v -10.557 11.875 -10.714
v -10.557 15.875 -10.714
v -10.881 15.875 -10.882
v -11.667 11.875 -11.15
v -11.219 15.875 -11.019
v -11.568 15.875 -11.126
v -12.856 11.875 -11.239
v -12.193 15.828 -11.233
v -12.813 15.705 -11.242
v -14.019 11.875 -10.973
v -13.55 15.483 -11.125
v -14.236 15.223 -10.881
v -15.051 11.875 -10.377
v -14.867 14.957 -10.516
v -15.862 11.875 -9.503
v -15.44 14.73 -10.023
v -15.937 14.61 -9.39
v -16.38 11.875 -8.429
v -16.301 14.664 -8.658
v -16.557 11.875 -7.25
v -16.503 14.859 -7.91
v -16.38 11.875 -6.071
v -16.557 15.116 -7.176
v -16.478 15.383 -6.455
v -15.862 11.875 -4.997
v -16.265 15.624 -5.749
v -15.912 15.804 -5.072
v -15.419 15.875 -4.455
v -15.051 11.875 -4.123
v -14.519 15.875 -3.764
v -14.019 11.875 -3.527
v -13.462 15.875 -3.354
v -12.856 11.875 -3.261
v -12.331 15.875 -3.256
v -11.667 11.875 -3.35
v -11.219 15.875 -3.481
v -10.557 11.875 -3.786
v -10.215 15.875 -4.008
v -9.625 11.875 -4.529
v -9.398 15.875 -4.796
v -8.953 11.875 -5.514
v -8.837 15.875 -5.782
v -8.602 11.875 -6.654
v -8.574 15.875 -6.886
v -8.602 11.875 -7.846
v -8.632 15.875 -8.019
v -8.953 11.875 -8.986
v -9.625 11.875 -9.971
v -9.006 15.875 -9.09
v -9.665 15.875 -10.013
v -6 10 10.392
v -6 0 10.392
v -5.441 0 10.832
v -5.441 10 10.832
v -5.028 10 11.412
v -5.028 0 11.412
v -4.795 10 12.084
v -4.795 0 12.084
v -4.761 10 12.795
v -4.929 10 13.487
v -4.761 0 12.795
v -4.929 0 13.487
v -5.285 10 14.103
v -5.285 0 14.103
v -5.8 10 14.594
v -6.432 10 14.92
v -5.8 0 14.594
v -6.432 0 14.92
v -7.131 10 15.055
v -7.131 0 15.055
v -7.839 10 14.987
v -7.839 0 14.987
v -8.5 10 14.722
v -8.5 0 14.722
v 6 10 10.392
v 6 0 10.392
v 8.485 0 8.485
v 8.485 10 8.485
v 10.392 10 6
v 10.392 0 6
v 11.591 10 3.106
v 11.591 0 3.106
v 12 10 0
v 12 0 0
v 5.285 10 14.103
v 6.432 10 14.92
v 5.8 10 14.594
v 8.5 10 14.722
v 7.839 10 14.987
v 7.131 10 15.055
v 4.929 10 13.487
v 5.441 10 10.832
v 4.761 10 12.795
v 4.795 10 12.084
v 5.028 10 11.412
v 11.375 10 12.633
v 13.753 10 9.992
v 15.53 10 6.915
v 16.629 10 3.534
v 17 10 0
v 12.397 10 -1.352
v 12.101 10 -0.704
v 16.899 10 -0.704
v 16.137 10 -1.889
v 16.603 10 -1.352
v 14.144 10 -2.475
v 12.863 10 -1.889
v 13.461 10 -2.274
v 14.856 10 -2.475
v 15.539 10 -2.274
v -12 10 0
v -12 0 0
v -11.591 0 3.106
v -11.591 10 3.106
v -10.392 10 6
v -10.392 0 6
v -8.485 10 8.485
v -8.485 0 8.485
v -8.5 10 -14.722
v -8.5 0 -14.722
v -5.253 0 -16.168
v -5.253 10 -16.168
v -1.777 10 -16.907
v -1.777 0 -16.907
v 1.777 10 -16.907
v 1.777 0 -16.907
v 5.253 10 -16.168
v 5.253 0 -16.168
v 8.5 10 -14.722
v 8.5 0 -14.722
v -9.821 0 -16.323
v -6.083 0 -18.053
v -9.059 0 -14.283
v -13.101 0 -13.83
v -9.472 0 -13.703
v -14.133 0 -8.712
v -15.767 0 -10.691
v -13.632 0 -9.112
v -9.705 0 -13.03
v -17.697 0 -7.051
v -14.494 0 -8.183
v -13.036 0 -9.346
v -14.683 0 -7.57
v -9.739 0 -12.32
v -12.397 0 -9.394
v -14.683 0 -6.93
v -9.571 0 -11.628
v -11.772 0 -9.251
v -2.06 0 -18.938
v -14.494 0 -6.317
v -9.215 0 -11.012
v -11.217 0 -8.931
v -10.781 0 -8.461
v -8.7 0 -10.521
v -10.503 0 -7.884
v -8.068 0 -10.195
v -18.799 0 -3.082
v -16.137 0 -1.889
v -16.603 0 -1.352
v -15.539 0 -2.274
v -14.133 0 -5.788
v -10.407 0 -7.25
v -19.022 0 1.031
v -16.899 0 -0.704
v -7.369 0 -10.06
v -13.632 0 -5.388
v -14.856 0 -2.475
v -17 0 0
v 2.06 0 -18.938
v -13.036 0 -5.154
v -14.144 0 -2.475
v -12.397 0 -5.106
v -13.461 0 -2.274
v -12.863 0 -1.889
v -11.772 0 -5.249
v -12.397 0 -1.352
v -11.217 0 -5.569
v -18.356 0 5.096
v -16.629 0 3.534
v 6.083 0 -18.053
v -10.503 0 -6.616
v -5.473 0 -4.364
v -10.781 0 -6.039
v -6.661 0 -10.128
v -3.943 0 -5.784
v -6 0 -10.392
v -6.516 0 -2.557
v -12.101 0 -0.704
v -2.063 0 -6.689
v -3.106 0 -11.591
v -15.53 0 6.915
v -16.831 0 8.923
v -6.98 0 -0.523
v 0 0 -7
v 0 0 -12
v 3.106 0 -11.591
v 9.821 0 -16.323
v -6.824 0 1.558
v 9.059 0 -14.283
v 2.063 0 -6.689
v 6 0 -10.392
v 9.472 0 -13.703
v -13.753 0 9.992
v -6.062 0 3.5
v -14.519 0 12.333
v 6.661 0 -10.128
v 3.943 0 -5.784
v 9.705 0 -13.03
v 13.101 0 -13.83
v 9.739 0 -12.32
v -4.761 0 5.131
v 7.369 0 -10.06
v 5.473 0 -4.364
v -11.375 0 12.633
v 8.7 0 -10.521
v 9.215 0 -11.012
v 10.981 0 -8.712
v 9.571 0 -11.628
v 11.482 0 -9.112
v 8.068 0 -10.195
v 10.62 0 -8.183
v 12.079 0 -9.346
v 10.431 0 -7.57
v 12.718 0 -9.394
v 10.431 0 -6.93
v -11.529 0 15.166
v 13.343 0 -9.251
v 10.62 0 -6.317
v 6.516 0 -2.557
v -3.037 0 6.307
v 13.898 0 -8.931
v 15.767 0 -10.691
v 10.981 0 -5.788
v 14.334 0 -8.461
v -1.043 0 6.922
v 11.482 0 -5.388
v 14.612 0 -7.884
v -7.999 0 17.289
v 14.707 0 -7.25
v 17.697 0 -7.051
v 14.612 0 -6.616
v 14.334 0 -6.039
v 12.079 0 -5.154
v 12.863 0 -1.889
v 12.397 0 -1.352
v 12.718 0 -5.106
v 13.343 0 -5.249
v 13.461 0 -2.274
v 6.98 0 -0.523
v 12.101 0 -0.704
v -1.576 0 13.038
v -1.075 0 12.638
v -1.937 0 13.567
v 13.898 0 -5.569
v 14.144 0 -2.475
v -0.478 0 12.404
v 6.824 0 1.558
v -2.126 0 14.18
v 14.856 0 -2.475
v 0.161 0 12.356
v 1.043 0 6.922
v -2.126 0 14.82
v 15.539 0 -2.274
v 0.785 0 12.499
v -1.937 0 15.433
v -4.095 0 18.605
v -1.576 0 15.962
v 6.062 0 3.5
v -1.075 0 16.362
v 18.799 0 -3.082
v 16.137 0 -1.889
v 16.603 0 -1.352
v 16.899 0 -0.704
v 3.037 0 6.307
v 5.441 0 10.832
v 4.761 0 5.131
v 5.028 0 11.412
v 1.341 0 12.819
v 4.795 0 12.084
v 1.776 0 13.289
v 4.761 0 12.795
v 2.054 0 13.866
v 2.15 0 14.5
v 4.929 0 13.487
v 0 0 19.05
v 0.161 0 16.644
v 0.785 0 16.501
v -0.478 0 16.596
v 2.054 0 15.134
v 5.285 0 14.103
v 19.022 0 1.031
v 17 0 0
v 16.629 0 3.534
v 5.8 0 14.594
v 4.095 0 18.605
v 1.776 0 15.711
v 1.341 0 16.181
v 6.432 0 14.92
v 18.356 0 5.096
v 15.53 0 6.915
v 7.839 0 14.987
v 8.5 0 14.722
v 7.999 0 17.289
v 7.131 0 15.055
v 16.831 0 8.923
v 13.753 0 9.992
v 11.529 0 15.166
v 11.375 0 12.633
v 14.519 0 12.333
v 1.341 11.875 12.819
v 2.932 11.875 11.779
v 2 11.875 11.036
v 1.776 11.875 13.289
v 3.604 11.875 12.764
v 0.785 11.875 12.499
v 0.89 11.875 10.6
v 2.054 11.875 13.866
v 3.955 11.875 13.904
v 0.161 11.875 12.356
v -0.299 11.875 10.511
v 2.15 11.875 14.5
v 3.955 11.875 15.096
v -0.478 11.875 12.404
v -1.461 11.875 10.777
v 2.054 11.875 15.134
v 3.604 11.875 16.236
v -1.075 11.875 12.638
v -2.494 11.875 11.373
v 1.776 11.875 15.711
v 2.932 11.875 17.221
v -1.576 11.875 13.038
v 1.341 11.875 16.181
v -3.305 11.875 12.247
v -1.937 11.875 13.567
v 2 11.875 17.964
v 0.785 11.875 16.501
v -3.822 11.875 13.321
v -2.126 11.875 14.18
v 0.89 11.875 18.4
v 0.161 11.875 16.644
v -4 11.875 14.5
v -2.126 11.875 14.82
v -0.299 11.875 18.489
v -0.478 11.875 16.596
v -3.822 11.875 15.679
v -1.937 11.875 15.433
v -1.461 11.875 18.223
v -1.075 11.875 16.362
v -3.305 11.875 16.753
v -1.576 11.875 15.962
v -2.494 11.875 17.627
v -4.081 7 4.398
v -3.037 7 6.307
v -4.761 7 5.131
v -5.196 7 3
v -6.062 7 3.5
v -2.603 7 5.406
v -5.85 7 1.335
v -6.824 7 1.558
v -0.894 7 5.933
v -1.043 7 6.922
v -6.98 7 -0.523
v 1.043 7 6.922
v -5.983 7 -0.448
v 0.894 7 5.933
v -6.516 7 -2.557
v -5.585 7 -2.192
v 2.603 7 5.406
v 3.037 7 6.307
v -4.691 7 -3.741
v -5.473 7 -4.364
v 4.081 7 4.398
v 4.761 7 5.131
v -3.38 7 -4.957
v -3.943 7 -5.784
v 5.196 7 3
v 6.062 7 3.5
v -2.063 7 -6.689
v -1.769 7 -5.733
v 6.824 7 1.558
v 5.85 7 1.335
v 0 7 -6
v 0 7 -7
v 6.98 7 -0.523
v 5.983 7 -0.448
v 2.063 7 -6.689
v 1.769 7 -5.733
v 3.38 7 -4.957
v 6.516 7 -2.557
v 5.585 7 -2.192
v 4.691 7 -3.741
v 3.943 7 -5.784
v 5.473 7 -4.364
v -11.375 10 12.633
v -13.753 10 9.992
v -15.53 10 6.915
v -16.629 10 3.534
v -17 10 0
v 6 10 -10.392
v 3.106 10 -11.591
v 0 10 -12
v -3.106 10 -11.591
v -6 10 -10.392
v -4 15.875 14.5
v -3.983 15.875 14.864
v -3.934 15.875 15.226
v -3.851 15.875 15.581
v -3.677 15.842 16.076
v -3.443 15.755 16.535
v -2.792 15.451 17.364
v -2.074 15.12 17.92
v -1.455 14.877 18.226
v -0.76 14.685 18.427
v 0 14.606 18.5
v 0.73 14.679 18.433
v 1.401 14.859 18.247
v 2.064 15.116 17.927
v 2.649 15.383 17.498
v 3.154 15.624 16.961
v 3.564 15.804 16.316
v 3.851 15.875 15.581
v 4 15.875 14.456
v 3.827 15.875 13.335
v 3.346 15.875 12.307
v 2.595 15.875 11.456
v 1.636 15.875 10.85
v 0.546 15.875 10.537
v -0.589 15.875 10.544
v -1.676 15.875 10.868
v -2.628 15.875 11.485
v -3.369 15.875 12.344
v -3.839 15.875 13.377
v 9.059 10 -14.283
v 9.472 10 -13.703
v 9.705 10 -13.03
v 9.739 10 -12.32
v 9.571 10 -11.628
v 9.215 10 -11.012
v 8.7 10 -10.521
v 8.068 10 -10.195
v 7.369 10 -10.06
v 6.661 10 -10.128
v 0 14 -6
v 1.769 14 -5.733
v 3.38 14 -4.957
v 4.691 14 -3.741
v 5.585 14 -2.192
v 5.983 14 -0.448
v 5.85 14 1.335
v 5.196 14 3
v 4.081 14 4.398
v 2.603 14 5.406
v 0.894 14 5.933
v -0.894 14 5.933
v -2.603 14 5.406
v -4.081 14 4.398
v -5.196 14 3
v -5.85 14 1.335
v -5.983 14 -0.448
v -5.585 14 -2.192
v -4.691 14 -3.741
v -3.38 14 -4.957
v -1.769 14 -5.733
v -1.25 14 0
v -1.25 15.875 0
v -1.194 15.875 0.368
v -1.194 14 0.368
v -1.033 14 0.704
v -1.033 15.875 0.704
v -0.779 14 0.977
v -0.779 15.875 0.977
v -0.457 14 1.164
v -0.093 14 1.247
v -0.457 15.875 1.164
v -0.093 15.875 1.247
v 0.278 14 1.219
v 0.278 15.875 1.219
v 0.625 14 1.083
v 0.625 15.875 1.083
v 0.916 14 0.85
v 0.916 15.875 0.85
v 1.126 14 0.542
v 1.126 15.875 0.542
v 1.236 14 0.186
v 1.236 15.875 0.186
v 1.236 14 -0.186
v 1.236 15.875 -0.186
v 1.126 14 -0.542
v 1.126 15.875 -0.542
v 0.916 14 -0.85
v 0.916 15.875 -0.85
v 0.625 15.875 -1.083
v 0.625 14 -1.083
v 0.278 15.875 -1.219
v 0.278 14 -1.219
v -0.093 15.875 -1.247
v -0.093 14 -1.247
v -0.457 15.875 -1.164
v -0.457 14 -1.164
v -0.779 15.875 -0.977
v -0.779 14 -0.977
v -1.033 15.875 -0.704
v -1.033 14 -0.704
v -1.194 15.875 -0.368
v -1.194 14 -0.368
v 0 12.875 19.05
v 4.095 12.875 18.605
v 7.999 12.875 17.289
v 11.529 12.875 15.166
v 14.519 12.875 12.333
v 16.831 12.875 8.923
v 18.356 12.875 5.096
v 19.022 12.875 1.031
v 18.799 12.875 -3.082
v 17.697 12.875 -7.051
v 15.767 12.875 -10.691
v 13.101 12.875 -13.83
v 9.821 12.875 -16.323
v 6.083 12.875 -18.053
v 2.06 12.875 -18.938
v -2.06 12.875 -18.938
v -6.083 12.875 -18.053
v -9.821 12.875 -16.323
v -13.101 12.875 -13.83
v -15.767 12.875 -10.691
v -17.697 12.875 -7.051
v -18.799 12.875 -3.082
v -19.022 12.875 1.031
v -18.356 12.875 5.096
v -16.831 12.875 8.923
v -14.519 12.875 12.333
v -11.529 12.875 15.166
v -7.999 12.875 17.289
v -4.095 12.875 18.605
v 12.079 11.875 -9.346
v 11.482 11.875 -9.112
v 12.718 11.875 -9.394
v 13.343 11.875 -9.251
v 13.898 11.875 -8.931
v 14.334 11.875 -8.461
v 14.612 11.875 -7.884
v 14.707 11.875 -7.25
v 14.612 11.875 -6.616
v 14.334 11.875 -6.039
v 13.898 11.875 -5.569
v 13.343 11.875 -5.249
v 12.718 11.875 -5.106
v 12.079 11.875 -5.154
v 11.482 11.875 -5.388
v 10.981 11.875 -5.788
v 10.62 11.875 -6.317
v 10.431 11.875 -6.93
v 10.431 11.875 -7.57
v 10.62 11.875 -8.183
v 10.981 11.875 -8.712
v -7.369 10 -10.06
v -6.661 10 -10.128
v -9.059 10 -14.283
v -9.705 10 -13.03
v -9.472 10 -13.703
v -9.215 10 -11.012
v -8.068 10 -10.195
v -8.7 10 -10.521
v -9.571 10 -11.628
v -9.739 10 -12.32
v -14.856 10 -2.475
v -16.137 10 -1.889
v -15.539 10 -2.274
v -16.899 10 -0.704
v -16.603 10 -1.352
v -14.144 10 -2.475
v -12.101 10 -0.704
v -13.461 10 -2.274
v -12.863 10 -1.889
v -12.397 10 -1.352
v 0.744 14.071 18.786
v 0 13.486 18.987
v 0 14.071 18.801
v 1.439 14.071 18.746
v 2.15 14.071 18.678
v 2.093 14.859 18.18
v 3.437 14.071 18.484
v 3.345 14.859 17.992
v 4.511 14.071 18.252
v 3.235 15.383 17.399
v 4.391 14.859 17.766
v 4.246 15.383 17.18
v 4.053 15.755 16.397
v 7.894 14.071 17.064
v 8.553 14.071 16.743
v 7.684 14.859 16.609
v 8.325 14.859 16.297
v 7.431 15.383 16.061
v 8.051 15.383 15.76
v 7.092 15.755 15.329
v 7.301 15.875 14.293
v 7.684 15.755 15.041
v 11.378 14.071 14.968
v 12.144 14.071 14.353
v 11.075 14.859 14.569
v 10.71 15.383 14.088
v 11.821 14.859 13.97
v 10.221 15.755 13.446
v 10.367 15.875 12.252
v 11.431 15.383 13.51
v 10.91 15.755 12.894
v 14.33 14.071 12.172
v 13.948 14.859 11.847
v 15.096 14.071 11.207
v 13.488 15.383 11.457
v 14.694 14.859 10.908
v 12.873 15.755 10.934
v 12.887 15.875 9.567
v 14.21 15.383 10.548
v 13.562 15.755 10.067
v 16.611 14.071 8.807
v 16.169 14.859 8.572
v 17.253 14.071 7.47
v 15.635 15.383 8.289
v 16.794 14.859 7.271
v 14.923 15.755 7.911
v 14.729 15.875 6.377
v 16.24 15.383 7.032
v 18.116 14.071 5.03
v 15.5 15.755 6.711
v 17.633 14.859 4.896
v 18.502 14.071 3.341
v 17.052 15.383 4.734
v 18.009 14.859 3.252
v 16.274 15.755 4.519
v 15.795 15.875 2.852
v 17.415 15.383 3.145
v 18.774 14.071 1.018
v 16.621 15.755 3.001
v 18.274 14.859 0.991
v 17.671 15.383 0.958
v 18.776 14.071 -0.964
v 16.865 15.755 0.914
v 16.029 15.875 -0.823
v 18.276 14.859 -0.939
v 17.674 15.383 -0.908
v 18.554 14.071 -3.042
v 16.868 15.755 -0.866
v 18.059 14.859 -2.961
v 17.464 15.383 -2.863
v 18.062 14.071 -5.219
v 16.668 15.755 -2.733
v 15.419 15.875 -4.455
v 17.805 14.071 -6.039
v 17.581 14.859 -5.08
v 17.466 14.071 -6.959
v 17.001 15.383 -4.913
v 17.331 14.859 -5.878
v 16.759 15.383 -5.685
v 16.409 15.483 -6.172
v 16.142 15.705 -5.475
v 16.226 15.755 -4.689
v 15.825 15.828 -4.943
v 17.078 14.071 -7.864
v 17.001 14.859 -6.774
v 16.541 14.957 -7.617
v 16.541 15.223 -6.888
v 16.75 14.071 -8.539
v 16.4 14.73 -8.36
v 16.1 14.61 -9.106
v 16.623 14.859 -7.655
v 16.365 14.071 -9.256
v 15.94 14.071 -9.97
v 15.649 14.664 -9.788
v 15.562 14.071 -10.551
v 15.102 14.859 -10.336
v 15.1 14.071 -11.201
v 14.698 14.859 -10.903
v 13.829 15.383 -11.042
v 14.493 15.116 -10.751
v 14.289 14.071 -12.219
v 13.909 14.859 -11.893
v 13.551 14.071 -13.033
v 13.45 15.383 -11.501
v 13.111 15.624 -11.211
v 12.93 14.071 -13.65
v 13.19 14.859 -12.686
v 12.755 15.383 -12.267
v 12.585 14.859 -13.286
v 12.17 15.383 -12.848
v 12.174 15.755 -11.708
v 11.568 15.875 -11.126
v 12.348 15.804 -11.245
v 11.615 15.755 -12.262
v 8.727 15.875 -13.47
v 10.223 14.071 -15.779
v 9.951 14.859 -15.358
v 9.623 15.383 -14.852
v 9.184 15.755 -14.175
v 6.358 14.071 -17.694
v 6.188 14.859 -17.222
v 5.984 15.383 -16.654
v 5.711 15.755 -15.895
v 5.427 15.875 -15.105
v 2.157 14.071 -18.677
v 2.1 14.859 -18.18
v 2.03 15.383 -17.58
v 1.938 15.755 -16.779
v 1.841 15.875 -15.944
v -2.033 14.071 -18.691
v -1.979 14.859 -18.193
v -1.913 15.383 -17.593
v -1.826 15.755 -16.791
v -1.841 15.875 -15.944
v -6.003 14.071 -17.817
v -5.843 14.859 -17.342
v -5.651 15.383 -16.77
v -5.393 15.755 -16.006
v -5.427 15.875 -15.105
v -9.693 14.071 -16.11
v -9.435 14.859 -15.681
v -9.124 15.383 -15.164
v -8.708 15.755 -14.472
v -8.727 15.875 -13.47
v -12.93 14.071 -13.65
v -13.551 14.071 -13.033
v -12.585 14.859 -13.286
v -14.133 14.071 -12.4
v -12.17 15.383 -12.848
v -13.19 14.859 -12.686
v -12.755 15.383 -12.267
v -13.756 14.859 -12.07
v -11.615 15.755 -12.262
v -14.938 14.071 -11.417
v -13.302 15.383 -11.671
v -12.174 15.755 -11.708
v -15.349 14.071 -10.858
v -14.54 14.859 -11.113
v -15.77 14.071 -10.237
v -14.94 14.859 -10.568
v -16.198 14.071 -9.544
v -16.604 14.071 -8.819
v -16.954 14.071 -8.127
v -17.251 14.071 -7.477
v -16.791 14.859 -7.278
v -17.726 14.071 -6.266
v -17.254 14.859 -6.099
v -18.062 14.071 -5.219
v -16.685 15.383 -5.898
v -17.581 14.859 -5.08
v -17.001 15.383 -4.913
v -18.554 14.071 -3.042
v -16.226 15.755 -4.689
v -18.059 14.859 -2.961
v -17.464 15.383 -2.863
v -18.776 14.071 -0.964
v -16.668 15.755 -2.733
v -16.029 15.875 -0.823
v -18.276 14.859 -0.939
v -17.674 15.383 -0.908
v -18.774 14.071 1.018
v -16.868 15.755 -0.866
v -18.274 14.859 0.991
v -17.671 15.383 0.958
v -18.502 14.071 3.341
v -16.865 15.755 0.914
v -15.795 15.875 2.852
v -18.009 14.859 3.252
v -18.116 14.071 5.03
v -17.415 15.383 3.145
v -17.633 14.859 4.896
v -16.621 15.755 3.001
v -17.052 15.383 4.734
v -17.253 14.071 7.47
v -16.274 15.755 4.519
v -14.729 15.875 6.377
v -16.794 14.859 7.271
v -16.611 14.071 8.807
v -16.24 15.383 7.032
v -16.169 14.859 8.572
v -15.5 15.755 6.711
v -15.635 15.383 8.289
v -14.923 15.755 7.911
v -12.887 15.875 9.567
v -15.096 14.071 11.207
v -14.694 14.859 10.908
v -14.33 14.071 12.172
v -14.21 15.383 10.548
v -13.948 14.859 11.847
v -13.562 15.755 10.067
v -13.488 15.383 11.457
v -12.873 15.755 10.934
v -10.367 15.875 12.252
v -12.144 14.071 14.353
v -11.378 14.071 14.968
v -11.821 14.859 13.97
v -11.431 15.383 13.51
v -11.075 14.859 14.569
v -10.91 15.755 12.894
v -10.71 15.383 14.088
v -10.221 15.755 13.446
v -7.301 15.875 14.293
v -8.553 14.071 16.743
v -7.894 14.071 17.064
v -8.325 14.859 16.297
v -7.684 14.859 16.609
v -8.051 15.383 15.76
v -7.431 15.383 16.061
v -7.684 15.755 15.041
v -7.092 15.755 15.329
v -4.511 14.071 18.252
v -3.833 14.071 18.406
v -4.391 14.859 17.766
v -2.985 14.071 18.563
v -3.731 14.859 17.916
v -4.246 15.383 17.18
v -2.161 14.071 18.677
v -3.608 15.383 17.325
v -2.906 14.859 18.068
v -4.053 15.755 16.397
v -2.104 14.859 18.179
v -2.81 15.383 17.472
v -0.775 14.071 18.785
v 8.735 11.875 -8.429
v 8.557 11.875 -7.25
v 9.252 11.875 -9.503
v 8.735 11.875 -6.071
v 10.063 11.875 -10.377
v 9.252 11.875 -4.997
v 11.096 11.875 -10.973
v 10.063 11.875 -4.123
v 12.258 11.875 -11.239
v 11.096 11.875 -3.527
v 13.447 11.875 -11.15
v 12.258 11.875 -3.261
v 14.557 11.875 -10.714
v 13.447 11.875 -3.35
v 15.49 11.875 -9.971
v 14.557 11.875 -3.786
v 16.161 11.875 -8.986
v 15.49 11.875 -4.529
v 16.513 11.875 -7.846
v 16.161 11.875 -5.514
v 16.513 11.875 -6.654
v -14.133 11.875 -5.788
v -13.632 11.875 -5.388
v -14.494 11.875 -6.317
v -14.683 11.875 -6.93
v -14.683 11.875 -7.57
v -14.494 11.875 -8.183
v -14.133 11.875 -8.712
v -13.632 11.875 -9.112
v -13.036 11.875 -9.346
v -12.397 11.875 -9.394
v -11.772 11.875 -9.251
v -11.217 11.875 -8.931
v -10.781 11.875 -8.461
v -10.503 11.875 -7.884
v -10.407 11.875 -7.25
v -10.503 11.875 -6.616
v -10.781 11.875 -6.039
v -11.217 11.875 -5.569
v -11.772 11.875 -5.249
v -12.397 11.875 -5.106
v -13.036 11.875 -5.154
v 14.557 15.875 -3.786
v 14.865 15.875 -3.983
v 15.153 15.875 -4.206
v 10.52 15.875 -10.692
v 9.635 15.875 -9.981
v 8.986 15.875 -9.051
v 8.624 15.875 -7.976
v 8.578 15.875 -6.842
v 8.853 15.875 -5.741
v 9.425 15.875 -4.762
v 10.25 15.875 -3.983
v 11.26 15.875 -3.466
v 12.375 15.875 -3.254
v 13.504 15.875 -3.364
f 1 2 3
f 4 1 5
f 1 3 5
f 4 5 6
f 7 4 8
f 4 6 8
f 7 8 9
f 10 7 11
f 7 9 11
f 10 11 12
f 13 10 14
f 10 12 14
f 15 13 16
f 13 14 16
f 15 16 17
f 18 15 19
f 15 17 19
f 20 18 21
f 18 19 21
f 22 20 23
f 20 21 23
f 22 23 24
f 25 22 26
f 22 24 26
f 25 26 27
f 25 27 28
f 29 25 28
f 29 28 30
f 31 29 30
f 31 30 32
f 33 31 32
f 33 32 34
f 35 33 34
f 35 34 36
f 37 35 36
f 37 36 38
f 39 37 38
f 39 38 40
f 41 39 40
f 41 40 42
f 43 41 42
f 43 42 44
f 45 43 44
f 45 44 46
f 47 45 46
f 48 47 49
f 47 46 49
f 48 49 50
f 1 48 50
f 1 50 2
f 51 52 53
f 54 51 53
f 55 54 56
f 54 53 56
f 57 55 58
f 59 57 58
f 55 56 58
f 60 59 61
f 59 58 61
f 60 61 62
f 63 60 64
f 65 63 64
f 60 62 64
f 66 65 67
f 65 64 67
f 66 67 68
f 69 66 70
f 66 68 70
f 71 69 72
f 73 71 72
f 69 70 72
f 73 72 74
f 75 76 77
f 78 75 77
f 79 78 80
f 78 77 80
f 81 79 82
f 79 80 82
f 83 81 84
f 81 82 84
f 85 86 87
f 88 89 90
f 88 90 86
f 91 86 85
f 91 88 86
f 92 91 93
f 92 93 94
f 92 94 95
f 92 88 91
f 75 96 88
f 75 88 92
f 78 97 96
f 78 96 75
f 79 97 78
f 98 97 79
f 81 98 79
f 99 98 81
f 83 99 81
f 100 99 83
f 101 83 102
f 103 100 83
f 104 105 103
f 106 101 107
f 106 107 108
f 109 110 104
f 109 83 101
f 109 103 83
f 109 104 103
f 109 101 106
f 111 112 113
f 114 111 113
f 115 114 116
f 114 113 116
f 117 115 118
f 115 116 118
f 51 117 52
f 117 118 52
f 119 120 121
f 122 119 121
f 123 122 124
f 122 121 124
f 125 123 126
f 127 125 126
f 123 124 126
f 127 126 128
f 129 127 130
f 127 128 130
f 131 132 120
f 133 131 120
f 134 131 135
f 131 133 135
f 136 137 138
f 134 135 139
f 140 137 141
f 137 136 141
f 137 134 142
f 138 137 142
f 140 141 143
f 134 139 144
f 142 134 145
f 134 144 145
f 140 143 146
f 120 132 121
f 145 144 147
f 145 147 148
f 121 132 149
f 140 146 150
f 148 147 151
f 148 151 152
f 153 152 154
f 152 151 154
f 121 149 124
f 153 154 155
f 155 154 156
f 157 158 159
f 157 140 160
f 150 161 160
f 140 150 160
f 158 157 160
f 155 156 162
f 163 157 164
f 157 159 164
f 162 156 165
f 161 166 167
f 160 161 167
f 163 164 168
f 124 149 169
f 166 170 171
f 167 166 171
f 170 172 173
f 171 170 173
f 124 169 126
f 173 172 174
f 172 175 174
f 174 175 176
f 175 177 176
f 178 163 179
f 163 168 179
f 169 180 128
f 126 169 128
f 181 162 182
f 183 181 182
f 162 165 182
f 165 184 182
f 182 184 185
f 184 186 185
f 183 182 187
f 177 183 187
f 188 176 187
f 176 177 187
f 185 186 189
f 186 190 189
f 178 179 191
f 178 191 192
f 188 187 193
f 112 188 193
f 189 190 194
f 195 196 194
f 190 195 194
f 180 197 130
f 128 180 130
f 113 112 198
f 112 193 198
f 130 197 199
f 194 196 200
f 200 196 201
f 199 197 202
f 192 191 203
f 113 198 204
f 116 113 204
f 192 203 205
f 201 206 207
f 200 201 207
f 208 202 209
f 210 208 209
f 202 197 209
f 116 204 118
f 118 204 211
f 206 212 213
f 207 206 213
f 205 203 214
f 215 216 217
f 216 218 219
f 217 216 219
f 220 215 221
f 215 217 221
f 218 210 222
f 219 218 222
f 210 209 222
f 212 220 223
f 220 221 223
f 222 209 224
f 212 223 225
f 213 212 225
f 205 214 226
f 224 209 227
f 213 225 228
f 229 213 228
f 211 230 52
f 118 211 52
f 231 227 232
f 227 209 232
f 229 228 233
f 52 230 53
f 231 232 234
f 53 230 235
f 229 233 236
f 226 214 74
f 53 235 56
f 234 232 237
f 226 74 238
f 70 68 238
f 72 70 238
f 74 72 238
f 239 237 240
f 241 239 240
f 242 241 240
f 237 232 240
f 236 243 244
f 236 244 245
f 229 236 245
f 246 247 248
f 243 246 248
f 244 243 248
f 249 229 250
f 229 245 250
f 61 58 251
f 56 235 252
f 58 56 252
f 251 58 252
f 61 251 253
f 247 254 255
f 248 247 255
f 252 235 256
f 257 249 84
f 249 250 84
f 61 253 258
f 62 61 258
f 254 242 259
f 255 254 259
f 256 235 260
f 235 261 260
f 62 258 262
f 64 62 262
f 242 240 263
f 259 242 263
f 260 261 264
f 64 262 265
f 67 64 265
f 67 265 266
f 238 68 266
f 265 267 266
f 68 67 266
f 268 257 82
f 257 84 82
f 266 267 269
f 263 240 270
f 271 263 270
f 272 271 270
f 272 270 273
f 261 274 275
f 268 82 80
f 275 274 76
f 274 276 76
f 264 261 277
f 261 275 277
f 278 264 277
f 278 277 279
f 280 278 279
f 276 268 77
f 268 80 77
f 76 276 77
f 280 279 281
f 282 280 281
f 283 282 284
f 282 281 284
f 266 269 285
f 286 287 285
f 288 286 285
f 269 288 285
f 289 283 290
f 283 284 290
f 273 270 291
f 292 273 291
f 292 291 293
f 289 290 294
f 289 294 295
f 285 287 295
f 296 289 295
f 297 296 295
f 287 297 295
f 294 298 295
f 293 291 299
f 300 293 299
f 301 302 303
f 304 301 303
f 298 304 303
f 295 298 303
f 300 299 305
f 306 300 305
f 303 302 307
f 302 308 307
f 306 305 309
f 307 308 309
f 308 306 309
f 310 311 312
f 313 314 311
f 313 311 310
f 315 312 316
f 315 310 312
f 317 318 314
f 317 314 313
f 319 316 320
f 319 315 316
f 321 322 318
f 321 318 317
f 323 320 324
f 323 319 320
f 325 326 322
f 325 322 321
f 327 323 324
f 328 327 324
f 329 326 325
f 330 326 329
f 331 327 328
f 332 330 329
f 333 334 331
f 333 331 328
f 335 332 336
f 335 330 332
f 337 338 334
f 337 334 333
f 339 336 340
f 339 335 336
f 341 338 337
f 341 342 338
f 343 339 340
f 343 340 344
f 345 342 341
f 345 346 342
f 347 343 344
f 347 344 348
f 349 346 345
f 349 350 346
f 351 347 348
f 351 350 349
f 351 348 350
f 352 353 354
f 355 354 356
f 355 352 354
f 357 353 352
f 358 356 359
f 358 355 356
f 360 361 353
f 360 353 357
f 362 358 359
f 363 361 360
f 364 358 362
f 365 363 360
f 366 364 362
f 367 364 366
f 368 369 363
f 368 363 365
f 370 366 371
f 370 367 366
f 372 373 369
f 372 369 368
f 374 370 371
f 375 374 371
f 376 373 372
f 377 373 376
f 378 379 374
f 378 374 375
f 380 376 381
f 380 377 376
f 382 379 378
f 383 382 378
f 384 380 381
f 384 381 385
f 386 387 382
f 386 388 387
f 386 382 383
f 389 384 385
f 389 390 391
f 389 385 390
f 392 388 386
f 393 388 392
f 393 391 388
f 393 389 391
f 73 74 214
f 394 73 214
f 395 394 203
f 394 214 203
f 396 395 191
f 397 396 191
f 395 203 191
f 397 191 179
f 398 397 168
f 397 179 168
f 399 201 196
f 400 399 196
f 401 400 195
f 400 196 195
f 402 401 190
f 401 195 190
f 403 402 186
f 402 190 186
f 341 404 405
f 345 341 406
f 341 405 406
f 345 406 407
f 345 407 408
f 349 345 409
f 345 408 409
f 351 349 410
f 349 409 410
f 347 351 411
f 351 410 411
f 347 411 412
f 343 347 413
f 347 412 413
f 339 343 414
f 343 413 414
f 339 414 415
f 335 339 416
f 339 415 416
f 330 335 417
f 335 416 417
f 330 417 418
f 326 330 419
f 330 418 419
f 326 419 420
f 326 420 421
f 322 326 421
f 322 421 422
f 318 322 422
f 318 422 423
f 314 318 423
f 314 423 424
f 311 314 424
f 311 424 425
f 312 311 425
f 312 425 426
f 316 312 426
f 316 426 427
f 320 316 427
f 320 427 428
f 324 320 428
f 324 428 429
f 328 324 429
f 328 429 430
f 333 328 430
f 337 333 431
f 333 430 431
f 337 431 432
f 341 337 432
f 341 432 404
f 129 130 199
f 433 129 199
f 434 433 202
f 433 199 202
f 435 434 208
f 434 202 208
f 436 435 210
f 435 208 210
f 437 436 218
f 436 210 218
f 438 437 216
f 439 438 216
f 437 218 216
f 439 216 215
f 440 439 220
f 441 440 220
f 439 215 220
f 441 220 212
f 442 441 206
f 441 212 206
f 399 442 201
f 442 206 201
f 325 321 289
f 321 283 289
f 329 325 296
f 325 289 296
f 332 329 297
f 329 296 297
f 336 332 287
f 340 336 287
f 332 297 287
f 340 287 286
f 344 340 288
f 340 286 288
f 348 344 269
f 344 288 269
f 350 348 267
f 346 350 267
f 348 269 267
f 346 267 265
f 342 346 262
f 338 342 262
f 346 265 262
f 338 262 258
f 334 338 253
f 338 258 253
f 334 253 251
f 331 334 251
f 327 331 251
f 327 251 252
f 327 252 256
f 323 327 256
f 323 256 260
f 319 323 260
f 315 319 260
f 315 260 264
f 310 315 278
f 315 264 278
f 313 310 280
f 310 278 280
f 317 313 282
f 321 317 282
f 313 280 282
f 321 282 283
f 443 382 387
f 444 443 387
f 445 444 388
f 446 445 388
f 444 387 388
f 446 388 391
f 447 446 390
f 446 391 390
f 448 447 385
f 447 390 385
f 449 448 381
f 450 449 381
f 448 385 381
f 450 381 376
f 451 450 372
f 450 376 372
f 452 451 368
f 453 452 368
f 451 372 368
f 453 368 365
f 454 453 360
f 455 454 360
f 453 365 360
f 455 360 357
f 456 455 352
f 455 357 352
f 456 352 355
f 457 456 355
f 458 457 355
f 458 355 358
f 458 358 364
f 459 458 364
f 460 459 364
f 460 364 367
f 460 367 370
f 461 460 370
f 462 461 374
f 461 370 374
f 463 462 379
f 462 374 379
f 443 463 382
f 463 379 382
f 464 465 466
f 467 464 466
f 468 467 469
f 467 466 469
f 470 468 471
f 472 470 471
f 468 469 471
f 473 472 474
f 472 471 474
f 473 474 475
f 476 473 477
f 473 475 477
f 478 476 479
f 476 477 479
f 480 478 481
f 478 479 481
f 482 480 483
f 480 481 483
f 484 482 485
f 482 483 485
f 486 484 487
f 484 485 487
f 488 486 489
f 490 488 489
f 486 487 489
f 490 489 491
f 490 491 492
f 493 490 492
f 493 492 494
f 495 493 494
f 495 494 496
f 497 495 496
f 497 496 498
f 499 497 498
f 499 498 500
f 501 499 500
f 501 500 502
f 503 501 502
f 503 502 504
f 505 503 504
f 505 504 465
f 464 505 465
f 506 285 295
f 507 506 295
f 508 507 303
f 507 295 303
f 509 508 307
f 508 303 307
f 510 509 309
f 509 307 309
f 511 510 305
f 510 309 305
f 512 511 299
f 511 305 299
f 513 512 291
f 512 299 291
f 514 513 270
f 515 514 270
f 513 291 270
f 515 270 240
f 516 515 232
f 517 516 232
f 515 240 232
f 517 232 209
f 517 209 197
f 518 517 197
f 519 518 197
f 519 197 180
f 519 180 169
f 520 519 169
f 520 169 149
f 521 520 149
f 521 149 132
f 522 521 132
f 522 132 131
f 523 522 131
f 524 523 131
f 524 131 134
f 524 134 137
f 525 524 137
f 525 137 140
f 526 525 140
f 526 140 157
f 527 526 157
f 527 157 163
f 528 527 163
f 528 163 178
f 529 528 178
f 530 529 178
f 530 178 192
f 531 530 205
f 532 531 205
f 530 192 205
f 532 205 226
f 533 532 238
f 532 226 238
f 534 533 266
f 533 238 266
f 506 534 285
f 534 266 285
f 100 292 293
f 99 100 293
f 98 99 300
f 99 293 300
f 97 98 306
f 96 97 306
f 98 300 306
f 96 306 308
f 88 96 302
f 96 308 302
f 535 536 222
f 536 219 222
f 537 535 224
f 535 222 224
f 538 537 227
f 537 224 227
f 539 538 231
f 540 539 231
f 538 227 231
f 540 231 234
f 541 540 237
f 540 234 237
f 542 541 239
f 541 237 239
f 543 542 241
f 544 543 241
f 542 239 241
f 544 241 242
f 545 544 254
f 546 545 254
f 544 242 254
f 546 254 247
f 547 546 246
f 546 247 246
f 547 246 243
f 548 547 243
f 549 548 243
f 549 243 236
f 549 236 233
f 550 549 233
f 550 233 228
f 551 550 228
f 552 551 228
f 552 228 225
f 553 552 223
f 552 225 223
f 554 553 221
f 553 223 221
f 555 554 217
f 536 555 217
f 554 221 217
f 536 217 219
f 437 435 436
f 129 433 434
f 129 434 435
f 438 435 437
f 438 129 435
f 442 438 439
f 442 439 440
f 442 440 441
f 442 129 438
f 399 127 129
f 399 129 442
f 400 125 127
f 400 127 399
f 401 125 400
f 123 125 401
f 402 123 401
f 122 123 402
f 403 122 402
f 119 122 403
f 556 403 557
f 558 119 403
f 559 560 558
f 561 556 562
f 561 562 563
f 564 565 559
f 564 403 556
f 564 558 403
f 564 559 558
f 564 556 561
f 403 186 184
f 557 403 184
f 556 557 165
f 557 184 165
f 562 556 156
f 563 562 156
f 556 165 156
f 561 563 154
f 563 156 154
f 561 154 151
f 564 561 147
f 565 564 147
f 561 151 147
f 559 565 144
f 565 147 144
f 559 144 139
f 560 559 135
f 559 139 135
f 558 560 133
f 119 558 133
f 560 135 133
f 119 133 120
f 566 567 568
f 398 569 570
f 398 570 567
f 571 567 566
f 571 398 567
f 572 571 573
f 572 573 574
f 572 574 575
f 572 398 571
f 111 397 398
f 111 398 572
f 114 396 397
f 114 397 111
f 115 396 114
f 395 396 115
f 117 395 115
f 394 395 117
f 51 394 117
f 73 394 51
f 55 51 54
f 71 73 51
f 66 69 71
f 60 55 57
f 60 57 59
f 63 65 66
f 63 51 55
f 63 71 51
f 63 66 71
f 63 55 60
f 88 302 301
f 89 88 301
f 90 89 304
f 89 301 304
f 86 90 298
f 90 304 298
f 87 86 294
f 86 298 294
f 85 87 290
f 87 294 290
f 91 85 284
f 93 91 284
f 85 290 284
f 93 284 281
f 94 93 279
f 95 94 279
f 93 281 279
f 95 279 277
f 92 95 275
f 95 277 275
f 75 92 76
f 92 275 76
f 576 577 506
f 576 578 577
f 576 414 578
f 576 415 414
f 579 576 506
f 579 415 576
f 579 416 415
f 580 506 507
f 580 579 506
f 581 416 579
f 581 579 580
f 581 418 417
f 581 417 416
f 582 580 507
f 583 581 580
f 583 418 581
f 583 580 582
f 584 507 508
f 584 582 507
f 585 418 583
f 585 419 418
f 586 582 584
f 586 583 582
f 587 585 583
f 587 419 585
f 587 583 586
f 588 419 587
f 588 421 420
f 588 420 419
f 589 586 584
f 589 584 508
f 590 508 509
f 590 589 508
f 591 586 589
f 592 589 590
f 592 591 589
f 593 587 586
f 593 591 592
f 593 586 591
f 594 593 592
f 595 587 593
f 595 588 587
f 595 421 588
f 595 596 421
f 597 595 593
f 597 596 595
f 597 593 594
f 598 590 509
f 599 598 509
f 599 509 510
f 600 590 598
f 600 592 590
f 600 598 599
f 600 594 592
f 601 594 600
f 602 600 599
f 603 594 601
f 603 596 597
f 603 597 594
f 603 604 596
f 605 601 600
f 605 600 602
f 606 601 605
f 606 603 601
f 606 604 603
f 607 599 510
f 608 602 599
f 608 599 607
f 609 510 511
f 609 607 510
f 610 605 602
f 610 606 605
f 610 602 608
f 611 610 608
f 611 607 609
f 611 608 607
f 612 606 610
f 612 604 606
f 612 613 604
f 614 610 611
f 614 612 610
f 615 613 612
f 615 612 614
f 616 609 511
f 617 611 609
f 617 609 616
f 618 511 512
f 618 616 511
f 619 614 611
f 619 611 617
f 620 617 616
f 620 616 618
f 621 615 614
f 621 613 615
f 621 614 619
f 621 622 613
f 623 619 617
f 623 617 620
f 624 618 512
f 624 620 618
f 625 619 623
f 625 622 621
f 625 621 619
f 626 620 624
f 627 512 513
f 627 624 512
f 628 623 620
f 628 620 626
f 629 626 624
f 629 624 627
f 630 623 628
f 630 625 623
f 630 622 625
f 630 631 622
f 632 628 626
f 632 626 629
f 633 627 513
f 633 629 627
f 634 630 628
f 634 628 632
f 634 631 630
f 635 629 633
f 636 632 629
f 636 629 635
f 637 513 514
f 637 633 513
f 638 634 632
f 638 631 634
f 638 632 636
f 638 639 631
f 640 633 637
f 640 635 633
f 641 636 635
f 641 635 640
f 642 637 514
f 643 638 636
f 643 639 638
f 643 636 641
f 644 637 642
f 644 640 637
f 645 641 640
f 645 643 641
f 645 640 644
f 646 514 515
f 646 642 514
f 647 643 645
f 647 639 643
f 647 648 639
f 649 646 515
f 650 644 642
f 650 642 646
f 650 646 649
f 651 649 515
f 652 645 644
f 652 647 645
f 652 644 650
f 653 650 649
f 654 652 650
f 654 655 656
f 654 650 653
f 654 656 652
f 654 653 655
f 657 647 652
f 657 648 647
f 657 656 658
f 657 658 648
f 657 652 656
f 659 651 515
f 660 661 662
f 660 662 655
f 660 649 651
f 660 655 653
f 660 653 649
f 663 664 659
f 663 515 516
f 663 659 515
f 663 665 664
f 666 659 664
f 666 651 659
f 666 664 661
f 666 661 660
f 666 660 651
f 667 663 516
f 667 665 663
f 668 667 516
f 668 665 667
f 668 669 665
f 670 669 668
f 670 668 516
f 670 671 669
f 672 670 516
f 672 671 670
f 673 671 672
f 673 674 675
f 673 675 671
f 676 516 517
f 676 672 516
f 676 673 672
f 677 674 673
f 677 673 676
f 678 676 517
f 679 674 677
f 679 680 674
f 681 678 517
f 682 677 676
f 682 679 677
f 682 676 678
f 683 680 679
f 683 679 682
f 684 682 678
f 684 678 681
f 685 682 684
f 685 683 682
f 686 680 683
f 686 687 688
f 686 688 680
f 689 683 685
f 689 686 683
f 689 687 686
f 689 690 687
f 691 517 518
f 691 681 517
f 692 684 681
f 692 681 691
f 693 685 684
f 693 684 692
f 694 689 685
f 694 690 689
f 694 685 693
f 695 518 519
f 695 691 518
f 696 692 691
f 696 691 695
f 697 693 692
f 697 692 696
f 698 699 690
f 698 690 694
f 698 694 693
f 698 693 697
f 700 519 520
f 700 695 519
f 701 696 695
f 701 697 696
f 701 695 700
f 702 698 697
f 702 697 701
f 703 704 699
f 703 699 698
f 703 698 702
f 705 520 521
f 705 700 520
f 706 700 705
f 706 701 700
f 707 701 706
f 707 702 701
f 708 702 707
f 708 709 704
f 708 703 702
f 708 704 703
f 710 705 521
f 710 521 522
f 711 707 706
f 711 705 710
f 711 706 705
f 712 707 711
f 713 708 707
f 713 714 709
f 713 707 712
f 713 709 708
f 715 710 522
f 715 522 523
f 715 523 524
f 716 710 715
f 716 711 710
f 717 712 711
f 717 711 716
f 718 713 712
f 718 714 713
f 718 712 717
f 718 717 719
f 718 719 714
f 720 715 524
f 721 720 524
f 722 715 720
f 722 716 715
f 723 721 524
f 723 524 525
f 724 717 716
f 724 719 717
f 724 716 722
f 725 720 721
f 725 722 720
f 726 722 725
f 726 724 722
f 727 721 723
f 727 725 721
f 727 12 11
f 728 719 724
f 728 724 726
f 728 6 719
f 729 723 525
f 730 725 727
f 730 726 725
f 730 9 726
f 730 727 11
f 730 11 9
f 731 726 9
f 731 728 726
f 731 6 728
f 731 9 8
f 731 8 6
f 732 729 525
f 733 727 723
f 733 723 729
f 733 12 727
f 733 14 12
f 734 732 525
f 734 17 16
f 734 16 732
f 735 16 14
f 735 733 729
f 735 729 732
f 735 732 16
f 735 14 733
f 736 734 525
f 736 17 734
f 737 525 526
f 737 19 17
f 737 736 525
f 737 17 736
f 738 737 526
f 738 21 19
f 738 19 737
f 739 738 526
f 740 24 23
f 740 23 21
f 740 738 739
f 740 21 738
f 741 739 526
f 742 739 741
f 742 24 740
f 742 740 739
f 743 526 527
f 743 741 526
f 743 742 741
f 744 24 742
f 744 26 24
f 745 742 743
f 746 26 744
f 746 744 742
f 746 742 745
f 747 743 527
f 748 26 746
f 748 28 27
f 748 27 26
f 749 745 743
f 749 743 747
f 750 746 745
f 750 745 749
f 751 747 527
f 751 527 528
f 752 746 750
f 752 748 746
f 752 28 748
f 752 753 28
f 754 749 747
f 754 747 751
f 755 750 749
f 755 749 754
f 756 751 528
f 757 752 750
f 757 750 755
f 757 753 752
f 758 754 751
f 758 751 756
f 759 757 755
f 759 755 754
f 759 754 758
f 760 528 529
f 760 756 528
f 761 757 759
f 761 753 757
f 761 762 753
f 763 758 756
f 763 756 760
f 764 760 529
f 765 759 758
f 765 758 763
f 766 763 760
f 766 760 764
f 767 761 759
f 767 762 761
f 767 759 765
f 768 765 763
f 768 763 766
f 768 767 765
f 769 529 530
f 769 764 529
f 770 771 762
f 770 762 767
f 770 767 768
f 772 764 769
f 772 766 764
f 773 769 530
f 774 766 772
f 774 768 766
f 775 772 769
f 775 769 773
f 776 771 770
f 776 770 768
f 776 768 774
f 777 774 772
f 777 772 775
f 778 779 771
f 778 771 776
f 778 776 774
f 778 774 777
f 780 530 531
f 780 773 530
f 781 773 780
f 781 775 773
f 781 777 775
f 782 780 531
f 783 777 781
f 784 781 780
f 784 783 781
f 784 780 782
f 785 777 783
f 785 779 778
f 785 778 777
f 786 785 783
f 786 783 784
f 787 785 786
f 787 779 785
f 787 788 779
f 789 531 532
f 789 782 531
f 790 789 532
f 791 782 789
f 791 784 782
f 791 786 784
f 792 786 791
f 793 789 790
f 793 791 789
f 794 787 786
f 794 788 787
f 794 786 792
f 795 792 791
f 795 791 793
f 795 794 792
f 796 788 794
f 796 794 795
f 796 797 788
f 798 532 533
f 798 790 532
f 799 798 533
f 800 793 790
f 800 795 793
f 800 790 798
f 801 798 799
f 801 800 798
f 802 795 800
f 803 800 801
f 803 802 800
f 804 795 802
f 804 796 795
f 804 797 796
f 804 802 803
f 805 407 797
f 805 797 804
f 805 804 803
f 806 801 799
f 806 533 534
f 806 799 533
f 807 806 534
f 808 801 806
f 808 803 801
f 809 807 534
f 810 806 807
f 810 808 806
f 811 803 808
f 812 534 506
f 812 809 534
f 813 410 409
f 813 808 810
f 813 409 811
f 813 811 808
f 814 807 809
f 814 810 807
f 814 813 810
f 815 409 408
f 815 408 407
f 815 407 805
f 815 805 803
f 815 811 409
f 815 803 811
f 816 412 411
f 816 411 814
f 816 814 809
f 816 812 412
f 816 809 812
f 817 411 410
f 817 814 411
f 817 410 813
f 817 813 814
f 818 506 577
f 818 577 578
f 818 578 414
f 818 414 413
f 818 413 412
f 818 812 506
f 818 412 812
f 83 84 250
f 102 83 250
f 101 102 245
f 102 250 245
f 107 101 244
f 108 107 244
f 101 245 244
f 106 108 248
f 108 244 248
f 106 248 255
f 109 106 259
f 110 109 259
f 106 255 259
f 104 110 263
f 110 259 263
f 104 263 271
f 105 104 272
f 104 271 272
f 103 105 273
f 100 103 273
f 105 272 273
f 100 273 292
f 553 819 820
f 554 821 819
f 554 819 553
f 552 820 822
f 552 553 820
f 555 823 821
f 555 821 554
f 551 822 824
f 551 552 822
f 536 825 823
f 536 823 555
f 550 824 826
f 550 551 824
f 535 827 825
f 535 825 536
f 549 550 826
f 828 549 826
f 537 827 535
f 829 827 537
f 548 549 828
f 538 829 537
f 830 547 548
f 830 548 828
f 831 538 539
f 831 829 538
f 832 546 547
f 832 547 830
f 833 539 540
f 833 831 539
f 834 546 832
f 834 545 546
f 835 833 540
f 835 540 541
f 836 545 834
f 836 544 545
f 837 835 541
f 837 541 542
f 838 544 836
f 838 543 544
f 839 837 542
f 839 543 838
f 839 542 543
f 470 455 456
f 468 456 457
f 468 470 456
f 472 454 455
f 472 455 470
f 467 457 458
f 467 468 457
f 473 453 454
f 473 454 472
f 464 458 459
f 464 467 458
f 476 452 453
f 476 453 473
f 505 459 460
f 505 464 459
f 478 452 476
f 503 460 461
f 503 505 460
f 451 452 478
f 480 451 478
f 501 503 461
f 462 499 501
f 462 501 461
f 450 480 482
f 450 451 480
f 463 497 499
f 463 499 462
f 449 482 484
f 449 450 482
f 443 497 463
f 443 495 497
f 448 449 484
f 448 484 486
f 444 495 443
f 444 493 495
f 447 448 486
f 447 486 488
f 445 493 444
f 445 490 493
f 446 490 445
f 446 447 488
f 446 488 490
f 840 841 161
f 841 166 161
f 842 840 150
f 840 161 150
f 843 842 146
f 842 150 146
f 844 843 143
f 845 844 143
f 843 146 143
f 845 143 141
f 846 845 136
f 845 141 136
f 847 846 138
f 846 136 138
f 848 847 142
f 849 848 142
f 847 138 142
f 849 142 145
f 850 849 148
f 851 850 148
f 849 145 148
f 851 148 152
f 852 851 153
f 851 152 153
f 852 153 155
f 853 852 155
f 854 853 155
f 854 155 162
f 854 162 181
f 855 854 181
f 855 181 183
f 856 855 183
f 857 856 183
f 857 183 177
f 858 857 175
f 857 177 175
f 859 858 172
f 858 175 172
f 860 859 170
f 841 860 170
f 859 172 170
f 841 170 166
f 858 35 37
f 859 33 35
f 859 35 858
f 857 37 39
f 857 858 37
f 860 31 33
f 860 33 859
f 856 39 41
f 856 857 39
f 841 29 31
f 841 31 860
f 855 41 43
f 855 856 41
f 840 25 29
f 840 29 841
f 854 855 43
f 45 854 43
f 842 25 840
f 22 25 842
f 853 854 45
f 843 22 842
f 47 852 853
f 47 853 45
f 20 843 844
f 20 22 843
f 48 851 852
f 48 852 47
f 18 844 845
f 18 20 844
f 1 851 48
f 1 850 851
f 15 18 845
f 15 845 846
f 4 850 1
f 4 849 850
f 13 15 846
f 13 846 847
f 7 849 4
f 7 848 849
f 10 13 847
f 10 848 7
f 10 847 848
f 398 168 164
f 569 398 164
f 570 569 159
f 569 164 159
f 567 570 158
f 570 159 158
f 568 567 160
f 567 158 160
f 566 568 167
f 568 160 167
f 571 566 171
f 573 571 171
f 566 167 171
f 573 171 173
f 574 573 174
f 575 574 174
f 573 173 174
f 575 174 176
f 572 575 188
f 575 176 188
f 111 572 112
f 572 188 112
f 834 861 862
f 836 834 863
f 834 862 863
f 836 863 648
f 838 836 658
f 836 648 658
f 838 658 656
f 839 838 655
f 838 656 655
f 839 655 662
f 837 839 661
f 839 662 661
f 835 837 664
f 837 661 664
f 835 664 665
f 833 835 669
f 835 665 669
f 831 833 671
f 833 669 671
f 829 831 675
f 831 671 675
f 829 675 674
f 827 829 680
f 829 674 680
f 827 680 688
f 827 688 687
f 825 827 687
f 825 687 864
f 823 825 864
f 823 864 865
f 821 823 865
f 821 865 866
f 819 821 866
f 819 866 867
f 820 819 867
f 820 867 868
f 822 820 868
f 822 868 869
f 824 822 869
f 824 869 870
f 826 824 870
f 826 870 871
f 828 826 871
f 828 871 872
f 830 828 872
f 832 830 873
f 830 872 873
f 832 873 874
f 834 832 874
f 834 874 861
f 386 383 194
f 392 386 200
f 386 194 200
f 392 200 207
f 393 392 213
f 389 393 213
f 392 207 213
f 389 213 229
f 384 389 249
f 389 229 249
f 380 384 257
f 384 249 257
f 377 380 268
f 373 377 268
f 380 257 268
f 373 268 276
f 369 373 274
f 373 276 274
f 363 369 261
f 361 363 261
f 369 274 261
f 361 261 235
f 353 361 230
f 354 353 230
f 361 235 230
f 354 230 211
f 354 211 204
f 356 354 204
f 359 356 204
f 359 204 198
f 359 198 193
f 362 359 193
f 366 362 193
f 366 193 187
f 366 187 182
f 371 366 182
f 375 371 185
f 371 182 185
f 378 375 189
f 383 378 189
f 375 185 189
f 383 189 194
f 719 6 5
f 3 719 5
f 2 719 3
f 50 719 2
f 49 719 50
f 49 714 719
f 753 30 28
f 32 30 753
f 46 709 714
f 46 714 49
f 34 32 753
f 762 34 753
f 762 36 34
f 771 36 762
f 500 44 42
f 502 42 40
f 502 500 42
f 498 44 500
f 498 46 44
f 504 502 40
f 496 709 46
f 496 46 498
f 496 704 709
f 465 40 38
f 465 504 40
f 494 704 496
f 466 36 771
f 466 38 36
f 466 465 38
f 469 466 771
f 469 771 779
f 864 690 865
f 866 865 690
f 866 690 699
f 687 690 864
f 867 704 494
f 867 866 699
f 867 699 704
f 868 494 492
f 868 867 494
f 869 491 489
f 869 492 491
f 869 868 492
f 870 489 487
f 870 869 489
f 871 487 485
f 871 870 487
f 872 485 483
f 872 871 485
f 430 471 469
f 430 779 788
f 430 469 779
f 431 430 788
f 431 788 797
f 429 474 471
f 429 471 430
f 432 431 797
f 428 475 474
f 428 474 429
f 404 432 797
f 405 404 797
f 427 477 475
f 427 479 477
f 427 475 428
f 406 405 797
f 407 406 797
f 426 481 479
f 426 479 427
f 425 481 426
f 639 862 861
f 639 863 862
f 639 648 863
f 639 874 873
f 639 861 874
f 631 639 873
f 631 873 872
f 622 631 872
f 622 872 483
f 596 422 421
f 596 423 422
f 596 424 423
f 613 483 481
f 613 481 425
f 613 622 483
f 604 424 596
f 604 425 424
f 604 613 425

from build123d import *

# Parameters (mm, degrees)
SKETCH1_R                      = 19.05
BOSS_EXTRUDE1_DEPTH            = 15.875
SKETCH2_R                      = 7
CUT_EXTRUDE1_DEPTH             = 7
SKETCH3_R                      = 6
CUT_EXTRUDE2_DEPTH             = 7
M3X0_5_TAPPED_HOLE1_D          = 2.5
CBORE_FOR_M4_SHCS1_D           = 4.3
CBORE_FOR_M4_SHCS1_CBORE_D     = 8
CBORE_FOR_M4_SHCS1_CBORE_DEPTH = 4
CIRPATTERN1_COUNT              = 3
FILLET1_R                      = 3
CUT_EXTRUDE3_DEPTH             = 10
CIRPATTERN2_COUNT              = 3


with BuildPart() as part:
    # Sketch1 → Boss-Extrude1 (new body)
    with BuildSketch(Plane(origin=(0, 0, 0), x_dir=(1, 0, 0), z_dir=(0, 1, 0))):
        with Locations(Location((0, 0, 0), (0, 0, 270))):
            Circle(SKETCH1_R)
    extrude(amount=BOSS_EXTRUDE1_DEPTH)

    # Sketch2 → Cut-Extrude1 (cut)
    with BuildSketch(Plane.XZ):
        with Locations(Location((0, 0, 0), (0, 0, 270))):
            Circle(SKETCH2_R)
    extrude(amount=-CUT_EXTRUDE1_DEPTH, mode=Mode.SUBTRACT)

    # Sketch3 → Cut-Extrude2 (cut)
    with BuildSketch(Plane.XZ.offset(-7)):
        with Locations(Location((0, 0, 0), (0, 0, 270))):
            Circle(SKETCH3_R)
    extrude(amount=-CUT_EXTRUDE2_DEPTH, mode=Mode.SUBTRACT)

    # M3x0.5 Tapped Hole1 (through all)
    with Locations(Plane.XZ.offset(-14)):
        with Locations((0, 0)):
            Hole(M3X0_5_TAPPED_HOLE1_D / 2)

    # CBORE for M4 SHCS1 (through all)
    with Locations(Plane(origin=(0, 15.875, 0), x_dir=(-1, 0, 0), z_dir=(0, 1, 0))):
        with Locations((0, 14.5)):
            cbore_for_m4_shcs1 = CounterBoreHole(CBORE_FOR_M4_SHCS1_D / 2, CBORE_FOR_M4_SHCS1_CBORE_D / 2, CBORE_FOR_M4_SHCS1_CBORE_DEPTH)

    # CirPattern1: CBORE for M4 SHCS1 ×3 about axis
    cirpattern1_axis = Axis((0, 0, 0), (0, 1, 0))
    for i in range(1, CIRPATTERN1_COUNT):
        add(cbore_for_m4_shcs1.rotate(cirpattern1_axis, i * 360 / CIRPATTERN1_COUNT), mode=Mode.SUBTRACT)

    # Fillet1
    # the kernel refuses this fillet: 3 mm, written as the material it takes off along each edge
    with BuildSketch(Plane(origin=(0, 15.875, 0), x_dir=(0, 0, 1), z_dir=(-1, 0, 0))) as fillet1_piece_1:
        with BuildLine():
            CenterArc((19.05 - FILLET1_R, -FILLET1_R), FILLET1_R, 0, 90)
            Line((19.05 - FILLET1_R, 0), (19.05, 0))
            Line((19.05, 0), (19.05, -FILLET1_R))
        make_face()
    revolve(axis=Axis((0, 15.875, 0), (0, 1, 0)), mode=Mode.SUBTRACT)

    # Sketch9 → Cut-Extrude3 (cut)
    with BuildSketch(Plane.XZ):
        with BuildLine():
            ThreePointArc((-6, 10.392304845), (-5.084936491, 13.807368355), (-8.5, 14.722431864))
            ThreePointArc((-8.5, 14.722431864), (-14.722431864, 8.5), (-17, 0))
            ThreePointArc((-17, 0), (-14.5, -2.5), (-12, 0))
            ThreePointArc((-12, 0), (-10.392304845, 6), (-6, 10.392304845))
        make_face()
    cut_extrude3 = extrude(amount=-CUT_EXTRUDE3_DEPTH, mode=Mode.SUBTRACT)

    # CirPattern2: Cut-Extrude3 ×3 about axis
    cirpattern2_axis = Axis((0, 0, 0), (0, 1, 0))
    for i in range(1, CIRPATTERN2_COUNT):
        add(cut_extrude3.rotate(cirpattern2_axis, i * 360 / CIRPATTERN2_COUNT), mode=Mode.SUBTRACT)


solid = part.part
